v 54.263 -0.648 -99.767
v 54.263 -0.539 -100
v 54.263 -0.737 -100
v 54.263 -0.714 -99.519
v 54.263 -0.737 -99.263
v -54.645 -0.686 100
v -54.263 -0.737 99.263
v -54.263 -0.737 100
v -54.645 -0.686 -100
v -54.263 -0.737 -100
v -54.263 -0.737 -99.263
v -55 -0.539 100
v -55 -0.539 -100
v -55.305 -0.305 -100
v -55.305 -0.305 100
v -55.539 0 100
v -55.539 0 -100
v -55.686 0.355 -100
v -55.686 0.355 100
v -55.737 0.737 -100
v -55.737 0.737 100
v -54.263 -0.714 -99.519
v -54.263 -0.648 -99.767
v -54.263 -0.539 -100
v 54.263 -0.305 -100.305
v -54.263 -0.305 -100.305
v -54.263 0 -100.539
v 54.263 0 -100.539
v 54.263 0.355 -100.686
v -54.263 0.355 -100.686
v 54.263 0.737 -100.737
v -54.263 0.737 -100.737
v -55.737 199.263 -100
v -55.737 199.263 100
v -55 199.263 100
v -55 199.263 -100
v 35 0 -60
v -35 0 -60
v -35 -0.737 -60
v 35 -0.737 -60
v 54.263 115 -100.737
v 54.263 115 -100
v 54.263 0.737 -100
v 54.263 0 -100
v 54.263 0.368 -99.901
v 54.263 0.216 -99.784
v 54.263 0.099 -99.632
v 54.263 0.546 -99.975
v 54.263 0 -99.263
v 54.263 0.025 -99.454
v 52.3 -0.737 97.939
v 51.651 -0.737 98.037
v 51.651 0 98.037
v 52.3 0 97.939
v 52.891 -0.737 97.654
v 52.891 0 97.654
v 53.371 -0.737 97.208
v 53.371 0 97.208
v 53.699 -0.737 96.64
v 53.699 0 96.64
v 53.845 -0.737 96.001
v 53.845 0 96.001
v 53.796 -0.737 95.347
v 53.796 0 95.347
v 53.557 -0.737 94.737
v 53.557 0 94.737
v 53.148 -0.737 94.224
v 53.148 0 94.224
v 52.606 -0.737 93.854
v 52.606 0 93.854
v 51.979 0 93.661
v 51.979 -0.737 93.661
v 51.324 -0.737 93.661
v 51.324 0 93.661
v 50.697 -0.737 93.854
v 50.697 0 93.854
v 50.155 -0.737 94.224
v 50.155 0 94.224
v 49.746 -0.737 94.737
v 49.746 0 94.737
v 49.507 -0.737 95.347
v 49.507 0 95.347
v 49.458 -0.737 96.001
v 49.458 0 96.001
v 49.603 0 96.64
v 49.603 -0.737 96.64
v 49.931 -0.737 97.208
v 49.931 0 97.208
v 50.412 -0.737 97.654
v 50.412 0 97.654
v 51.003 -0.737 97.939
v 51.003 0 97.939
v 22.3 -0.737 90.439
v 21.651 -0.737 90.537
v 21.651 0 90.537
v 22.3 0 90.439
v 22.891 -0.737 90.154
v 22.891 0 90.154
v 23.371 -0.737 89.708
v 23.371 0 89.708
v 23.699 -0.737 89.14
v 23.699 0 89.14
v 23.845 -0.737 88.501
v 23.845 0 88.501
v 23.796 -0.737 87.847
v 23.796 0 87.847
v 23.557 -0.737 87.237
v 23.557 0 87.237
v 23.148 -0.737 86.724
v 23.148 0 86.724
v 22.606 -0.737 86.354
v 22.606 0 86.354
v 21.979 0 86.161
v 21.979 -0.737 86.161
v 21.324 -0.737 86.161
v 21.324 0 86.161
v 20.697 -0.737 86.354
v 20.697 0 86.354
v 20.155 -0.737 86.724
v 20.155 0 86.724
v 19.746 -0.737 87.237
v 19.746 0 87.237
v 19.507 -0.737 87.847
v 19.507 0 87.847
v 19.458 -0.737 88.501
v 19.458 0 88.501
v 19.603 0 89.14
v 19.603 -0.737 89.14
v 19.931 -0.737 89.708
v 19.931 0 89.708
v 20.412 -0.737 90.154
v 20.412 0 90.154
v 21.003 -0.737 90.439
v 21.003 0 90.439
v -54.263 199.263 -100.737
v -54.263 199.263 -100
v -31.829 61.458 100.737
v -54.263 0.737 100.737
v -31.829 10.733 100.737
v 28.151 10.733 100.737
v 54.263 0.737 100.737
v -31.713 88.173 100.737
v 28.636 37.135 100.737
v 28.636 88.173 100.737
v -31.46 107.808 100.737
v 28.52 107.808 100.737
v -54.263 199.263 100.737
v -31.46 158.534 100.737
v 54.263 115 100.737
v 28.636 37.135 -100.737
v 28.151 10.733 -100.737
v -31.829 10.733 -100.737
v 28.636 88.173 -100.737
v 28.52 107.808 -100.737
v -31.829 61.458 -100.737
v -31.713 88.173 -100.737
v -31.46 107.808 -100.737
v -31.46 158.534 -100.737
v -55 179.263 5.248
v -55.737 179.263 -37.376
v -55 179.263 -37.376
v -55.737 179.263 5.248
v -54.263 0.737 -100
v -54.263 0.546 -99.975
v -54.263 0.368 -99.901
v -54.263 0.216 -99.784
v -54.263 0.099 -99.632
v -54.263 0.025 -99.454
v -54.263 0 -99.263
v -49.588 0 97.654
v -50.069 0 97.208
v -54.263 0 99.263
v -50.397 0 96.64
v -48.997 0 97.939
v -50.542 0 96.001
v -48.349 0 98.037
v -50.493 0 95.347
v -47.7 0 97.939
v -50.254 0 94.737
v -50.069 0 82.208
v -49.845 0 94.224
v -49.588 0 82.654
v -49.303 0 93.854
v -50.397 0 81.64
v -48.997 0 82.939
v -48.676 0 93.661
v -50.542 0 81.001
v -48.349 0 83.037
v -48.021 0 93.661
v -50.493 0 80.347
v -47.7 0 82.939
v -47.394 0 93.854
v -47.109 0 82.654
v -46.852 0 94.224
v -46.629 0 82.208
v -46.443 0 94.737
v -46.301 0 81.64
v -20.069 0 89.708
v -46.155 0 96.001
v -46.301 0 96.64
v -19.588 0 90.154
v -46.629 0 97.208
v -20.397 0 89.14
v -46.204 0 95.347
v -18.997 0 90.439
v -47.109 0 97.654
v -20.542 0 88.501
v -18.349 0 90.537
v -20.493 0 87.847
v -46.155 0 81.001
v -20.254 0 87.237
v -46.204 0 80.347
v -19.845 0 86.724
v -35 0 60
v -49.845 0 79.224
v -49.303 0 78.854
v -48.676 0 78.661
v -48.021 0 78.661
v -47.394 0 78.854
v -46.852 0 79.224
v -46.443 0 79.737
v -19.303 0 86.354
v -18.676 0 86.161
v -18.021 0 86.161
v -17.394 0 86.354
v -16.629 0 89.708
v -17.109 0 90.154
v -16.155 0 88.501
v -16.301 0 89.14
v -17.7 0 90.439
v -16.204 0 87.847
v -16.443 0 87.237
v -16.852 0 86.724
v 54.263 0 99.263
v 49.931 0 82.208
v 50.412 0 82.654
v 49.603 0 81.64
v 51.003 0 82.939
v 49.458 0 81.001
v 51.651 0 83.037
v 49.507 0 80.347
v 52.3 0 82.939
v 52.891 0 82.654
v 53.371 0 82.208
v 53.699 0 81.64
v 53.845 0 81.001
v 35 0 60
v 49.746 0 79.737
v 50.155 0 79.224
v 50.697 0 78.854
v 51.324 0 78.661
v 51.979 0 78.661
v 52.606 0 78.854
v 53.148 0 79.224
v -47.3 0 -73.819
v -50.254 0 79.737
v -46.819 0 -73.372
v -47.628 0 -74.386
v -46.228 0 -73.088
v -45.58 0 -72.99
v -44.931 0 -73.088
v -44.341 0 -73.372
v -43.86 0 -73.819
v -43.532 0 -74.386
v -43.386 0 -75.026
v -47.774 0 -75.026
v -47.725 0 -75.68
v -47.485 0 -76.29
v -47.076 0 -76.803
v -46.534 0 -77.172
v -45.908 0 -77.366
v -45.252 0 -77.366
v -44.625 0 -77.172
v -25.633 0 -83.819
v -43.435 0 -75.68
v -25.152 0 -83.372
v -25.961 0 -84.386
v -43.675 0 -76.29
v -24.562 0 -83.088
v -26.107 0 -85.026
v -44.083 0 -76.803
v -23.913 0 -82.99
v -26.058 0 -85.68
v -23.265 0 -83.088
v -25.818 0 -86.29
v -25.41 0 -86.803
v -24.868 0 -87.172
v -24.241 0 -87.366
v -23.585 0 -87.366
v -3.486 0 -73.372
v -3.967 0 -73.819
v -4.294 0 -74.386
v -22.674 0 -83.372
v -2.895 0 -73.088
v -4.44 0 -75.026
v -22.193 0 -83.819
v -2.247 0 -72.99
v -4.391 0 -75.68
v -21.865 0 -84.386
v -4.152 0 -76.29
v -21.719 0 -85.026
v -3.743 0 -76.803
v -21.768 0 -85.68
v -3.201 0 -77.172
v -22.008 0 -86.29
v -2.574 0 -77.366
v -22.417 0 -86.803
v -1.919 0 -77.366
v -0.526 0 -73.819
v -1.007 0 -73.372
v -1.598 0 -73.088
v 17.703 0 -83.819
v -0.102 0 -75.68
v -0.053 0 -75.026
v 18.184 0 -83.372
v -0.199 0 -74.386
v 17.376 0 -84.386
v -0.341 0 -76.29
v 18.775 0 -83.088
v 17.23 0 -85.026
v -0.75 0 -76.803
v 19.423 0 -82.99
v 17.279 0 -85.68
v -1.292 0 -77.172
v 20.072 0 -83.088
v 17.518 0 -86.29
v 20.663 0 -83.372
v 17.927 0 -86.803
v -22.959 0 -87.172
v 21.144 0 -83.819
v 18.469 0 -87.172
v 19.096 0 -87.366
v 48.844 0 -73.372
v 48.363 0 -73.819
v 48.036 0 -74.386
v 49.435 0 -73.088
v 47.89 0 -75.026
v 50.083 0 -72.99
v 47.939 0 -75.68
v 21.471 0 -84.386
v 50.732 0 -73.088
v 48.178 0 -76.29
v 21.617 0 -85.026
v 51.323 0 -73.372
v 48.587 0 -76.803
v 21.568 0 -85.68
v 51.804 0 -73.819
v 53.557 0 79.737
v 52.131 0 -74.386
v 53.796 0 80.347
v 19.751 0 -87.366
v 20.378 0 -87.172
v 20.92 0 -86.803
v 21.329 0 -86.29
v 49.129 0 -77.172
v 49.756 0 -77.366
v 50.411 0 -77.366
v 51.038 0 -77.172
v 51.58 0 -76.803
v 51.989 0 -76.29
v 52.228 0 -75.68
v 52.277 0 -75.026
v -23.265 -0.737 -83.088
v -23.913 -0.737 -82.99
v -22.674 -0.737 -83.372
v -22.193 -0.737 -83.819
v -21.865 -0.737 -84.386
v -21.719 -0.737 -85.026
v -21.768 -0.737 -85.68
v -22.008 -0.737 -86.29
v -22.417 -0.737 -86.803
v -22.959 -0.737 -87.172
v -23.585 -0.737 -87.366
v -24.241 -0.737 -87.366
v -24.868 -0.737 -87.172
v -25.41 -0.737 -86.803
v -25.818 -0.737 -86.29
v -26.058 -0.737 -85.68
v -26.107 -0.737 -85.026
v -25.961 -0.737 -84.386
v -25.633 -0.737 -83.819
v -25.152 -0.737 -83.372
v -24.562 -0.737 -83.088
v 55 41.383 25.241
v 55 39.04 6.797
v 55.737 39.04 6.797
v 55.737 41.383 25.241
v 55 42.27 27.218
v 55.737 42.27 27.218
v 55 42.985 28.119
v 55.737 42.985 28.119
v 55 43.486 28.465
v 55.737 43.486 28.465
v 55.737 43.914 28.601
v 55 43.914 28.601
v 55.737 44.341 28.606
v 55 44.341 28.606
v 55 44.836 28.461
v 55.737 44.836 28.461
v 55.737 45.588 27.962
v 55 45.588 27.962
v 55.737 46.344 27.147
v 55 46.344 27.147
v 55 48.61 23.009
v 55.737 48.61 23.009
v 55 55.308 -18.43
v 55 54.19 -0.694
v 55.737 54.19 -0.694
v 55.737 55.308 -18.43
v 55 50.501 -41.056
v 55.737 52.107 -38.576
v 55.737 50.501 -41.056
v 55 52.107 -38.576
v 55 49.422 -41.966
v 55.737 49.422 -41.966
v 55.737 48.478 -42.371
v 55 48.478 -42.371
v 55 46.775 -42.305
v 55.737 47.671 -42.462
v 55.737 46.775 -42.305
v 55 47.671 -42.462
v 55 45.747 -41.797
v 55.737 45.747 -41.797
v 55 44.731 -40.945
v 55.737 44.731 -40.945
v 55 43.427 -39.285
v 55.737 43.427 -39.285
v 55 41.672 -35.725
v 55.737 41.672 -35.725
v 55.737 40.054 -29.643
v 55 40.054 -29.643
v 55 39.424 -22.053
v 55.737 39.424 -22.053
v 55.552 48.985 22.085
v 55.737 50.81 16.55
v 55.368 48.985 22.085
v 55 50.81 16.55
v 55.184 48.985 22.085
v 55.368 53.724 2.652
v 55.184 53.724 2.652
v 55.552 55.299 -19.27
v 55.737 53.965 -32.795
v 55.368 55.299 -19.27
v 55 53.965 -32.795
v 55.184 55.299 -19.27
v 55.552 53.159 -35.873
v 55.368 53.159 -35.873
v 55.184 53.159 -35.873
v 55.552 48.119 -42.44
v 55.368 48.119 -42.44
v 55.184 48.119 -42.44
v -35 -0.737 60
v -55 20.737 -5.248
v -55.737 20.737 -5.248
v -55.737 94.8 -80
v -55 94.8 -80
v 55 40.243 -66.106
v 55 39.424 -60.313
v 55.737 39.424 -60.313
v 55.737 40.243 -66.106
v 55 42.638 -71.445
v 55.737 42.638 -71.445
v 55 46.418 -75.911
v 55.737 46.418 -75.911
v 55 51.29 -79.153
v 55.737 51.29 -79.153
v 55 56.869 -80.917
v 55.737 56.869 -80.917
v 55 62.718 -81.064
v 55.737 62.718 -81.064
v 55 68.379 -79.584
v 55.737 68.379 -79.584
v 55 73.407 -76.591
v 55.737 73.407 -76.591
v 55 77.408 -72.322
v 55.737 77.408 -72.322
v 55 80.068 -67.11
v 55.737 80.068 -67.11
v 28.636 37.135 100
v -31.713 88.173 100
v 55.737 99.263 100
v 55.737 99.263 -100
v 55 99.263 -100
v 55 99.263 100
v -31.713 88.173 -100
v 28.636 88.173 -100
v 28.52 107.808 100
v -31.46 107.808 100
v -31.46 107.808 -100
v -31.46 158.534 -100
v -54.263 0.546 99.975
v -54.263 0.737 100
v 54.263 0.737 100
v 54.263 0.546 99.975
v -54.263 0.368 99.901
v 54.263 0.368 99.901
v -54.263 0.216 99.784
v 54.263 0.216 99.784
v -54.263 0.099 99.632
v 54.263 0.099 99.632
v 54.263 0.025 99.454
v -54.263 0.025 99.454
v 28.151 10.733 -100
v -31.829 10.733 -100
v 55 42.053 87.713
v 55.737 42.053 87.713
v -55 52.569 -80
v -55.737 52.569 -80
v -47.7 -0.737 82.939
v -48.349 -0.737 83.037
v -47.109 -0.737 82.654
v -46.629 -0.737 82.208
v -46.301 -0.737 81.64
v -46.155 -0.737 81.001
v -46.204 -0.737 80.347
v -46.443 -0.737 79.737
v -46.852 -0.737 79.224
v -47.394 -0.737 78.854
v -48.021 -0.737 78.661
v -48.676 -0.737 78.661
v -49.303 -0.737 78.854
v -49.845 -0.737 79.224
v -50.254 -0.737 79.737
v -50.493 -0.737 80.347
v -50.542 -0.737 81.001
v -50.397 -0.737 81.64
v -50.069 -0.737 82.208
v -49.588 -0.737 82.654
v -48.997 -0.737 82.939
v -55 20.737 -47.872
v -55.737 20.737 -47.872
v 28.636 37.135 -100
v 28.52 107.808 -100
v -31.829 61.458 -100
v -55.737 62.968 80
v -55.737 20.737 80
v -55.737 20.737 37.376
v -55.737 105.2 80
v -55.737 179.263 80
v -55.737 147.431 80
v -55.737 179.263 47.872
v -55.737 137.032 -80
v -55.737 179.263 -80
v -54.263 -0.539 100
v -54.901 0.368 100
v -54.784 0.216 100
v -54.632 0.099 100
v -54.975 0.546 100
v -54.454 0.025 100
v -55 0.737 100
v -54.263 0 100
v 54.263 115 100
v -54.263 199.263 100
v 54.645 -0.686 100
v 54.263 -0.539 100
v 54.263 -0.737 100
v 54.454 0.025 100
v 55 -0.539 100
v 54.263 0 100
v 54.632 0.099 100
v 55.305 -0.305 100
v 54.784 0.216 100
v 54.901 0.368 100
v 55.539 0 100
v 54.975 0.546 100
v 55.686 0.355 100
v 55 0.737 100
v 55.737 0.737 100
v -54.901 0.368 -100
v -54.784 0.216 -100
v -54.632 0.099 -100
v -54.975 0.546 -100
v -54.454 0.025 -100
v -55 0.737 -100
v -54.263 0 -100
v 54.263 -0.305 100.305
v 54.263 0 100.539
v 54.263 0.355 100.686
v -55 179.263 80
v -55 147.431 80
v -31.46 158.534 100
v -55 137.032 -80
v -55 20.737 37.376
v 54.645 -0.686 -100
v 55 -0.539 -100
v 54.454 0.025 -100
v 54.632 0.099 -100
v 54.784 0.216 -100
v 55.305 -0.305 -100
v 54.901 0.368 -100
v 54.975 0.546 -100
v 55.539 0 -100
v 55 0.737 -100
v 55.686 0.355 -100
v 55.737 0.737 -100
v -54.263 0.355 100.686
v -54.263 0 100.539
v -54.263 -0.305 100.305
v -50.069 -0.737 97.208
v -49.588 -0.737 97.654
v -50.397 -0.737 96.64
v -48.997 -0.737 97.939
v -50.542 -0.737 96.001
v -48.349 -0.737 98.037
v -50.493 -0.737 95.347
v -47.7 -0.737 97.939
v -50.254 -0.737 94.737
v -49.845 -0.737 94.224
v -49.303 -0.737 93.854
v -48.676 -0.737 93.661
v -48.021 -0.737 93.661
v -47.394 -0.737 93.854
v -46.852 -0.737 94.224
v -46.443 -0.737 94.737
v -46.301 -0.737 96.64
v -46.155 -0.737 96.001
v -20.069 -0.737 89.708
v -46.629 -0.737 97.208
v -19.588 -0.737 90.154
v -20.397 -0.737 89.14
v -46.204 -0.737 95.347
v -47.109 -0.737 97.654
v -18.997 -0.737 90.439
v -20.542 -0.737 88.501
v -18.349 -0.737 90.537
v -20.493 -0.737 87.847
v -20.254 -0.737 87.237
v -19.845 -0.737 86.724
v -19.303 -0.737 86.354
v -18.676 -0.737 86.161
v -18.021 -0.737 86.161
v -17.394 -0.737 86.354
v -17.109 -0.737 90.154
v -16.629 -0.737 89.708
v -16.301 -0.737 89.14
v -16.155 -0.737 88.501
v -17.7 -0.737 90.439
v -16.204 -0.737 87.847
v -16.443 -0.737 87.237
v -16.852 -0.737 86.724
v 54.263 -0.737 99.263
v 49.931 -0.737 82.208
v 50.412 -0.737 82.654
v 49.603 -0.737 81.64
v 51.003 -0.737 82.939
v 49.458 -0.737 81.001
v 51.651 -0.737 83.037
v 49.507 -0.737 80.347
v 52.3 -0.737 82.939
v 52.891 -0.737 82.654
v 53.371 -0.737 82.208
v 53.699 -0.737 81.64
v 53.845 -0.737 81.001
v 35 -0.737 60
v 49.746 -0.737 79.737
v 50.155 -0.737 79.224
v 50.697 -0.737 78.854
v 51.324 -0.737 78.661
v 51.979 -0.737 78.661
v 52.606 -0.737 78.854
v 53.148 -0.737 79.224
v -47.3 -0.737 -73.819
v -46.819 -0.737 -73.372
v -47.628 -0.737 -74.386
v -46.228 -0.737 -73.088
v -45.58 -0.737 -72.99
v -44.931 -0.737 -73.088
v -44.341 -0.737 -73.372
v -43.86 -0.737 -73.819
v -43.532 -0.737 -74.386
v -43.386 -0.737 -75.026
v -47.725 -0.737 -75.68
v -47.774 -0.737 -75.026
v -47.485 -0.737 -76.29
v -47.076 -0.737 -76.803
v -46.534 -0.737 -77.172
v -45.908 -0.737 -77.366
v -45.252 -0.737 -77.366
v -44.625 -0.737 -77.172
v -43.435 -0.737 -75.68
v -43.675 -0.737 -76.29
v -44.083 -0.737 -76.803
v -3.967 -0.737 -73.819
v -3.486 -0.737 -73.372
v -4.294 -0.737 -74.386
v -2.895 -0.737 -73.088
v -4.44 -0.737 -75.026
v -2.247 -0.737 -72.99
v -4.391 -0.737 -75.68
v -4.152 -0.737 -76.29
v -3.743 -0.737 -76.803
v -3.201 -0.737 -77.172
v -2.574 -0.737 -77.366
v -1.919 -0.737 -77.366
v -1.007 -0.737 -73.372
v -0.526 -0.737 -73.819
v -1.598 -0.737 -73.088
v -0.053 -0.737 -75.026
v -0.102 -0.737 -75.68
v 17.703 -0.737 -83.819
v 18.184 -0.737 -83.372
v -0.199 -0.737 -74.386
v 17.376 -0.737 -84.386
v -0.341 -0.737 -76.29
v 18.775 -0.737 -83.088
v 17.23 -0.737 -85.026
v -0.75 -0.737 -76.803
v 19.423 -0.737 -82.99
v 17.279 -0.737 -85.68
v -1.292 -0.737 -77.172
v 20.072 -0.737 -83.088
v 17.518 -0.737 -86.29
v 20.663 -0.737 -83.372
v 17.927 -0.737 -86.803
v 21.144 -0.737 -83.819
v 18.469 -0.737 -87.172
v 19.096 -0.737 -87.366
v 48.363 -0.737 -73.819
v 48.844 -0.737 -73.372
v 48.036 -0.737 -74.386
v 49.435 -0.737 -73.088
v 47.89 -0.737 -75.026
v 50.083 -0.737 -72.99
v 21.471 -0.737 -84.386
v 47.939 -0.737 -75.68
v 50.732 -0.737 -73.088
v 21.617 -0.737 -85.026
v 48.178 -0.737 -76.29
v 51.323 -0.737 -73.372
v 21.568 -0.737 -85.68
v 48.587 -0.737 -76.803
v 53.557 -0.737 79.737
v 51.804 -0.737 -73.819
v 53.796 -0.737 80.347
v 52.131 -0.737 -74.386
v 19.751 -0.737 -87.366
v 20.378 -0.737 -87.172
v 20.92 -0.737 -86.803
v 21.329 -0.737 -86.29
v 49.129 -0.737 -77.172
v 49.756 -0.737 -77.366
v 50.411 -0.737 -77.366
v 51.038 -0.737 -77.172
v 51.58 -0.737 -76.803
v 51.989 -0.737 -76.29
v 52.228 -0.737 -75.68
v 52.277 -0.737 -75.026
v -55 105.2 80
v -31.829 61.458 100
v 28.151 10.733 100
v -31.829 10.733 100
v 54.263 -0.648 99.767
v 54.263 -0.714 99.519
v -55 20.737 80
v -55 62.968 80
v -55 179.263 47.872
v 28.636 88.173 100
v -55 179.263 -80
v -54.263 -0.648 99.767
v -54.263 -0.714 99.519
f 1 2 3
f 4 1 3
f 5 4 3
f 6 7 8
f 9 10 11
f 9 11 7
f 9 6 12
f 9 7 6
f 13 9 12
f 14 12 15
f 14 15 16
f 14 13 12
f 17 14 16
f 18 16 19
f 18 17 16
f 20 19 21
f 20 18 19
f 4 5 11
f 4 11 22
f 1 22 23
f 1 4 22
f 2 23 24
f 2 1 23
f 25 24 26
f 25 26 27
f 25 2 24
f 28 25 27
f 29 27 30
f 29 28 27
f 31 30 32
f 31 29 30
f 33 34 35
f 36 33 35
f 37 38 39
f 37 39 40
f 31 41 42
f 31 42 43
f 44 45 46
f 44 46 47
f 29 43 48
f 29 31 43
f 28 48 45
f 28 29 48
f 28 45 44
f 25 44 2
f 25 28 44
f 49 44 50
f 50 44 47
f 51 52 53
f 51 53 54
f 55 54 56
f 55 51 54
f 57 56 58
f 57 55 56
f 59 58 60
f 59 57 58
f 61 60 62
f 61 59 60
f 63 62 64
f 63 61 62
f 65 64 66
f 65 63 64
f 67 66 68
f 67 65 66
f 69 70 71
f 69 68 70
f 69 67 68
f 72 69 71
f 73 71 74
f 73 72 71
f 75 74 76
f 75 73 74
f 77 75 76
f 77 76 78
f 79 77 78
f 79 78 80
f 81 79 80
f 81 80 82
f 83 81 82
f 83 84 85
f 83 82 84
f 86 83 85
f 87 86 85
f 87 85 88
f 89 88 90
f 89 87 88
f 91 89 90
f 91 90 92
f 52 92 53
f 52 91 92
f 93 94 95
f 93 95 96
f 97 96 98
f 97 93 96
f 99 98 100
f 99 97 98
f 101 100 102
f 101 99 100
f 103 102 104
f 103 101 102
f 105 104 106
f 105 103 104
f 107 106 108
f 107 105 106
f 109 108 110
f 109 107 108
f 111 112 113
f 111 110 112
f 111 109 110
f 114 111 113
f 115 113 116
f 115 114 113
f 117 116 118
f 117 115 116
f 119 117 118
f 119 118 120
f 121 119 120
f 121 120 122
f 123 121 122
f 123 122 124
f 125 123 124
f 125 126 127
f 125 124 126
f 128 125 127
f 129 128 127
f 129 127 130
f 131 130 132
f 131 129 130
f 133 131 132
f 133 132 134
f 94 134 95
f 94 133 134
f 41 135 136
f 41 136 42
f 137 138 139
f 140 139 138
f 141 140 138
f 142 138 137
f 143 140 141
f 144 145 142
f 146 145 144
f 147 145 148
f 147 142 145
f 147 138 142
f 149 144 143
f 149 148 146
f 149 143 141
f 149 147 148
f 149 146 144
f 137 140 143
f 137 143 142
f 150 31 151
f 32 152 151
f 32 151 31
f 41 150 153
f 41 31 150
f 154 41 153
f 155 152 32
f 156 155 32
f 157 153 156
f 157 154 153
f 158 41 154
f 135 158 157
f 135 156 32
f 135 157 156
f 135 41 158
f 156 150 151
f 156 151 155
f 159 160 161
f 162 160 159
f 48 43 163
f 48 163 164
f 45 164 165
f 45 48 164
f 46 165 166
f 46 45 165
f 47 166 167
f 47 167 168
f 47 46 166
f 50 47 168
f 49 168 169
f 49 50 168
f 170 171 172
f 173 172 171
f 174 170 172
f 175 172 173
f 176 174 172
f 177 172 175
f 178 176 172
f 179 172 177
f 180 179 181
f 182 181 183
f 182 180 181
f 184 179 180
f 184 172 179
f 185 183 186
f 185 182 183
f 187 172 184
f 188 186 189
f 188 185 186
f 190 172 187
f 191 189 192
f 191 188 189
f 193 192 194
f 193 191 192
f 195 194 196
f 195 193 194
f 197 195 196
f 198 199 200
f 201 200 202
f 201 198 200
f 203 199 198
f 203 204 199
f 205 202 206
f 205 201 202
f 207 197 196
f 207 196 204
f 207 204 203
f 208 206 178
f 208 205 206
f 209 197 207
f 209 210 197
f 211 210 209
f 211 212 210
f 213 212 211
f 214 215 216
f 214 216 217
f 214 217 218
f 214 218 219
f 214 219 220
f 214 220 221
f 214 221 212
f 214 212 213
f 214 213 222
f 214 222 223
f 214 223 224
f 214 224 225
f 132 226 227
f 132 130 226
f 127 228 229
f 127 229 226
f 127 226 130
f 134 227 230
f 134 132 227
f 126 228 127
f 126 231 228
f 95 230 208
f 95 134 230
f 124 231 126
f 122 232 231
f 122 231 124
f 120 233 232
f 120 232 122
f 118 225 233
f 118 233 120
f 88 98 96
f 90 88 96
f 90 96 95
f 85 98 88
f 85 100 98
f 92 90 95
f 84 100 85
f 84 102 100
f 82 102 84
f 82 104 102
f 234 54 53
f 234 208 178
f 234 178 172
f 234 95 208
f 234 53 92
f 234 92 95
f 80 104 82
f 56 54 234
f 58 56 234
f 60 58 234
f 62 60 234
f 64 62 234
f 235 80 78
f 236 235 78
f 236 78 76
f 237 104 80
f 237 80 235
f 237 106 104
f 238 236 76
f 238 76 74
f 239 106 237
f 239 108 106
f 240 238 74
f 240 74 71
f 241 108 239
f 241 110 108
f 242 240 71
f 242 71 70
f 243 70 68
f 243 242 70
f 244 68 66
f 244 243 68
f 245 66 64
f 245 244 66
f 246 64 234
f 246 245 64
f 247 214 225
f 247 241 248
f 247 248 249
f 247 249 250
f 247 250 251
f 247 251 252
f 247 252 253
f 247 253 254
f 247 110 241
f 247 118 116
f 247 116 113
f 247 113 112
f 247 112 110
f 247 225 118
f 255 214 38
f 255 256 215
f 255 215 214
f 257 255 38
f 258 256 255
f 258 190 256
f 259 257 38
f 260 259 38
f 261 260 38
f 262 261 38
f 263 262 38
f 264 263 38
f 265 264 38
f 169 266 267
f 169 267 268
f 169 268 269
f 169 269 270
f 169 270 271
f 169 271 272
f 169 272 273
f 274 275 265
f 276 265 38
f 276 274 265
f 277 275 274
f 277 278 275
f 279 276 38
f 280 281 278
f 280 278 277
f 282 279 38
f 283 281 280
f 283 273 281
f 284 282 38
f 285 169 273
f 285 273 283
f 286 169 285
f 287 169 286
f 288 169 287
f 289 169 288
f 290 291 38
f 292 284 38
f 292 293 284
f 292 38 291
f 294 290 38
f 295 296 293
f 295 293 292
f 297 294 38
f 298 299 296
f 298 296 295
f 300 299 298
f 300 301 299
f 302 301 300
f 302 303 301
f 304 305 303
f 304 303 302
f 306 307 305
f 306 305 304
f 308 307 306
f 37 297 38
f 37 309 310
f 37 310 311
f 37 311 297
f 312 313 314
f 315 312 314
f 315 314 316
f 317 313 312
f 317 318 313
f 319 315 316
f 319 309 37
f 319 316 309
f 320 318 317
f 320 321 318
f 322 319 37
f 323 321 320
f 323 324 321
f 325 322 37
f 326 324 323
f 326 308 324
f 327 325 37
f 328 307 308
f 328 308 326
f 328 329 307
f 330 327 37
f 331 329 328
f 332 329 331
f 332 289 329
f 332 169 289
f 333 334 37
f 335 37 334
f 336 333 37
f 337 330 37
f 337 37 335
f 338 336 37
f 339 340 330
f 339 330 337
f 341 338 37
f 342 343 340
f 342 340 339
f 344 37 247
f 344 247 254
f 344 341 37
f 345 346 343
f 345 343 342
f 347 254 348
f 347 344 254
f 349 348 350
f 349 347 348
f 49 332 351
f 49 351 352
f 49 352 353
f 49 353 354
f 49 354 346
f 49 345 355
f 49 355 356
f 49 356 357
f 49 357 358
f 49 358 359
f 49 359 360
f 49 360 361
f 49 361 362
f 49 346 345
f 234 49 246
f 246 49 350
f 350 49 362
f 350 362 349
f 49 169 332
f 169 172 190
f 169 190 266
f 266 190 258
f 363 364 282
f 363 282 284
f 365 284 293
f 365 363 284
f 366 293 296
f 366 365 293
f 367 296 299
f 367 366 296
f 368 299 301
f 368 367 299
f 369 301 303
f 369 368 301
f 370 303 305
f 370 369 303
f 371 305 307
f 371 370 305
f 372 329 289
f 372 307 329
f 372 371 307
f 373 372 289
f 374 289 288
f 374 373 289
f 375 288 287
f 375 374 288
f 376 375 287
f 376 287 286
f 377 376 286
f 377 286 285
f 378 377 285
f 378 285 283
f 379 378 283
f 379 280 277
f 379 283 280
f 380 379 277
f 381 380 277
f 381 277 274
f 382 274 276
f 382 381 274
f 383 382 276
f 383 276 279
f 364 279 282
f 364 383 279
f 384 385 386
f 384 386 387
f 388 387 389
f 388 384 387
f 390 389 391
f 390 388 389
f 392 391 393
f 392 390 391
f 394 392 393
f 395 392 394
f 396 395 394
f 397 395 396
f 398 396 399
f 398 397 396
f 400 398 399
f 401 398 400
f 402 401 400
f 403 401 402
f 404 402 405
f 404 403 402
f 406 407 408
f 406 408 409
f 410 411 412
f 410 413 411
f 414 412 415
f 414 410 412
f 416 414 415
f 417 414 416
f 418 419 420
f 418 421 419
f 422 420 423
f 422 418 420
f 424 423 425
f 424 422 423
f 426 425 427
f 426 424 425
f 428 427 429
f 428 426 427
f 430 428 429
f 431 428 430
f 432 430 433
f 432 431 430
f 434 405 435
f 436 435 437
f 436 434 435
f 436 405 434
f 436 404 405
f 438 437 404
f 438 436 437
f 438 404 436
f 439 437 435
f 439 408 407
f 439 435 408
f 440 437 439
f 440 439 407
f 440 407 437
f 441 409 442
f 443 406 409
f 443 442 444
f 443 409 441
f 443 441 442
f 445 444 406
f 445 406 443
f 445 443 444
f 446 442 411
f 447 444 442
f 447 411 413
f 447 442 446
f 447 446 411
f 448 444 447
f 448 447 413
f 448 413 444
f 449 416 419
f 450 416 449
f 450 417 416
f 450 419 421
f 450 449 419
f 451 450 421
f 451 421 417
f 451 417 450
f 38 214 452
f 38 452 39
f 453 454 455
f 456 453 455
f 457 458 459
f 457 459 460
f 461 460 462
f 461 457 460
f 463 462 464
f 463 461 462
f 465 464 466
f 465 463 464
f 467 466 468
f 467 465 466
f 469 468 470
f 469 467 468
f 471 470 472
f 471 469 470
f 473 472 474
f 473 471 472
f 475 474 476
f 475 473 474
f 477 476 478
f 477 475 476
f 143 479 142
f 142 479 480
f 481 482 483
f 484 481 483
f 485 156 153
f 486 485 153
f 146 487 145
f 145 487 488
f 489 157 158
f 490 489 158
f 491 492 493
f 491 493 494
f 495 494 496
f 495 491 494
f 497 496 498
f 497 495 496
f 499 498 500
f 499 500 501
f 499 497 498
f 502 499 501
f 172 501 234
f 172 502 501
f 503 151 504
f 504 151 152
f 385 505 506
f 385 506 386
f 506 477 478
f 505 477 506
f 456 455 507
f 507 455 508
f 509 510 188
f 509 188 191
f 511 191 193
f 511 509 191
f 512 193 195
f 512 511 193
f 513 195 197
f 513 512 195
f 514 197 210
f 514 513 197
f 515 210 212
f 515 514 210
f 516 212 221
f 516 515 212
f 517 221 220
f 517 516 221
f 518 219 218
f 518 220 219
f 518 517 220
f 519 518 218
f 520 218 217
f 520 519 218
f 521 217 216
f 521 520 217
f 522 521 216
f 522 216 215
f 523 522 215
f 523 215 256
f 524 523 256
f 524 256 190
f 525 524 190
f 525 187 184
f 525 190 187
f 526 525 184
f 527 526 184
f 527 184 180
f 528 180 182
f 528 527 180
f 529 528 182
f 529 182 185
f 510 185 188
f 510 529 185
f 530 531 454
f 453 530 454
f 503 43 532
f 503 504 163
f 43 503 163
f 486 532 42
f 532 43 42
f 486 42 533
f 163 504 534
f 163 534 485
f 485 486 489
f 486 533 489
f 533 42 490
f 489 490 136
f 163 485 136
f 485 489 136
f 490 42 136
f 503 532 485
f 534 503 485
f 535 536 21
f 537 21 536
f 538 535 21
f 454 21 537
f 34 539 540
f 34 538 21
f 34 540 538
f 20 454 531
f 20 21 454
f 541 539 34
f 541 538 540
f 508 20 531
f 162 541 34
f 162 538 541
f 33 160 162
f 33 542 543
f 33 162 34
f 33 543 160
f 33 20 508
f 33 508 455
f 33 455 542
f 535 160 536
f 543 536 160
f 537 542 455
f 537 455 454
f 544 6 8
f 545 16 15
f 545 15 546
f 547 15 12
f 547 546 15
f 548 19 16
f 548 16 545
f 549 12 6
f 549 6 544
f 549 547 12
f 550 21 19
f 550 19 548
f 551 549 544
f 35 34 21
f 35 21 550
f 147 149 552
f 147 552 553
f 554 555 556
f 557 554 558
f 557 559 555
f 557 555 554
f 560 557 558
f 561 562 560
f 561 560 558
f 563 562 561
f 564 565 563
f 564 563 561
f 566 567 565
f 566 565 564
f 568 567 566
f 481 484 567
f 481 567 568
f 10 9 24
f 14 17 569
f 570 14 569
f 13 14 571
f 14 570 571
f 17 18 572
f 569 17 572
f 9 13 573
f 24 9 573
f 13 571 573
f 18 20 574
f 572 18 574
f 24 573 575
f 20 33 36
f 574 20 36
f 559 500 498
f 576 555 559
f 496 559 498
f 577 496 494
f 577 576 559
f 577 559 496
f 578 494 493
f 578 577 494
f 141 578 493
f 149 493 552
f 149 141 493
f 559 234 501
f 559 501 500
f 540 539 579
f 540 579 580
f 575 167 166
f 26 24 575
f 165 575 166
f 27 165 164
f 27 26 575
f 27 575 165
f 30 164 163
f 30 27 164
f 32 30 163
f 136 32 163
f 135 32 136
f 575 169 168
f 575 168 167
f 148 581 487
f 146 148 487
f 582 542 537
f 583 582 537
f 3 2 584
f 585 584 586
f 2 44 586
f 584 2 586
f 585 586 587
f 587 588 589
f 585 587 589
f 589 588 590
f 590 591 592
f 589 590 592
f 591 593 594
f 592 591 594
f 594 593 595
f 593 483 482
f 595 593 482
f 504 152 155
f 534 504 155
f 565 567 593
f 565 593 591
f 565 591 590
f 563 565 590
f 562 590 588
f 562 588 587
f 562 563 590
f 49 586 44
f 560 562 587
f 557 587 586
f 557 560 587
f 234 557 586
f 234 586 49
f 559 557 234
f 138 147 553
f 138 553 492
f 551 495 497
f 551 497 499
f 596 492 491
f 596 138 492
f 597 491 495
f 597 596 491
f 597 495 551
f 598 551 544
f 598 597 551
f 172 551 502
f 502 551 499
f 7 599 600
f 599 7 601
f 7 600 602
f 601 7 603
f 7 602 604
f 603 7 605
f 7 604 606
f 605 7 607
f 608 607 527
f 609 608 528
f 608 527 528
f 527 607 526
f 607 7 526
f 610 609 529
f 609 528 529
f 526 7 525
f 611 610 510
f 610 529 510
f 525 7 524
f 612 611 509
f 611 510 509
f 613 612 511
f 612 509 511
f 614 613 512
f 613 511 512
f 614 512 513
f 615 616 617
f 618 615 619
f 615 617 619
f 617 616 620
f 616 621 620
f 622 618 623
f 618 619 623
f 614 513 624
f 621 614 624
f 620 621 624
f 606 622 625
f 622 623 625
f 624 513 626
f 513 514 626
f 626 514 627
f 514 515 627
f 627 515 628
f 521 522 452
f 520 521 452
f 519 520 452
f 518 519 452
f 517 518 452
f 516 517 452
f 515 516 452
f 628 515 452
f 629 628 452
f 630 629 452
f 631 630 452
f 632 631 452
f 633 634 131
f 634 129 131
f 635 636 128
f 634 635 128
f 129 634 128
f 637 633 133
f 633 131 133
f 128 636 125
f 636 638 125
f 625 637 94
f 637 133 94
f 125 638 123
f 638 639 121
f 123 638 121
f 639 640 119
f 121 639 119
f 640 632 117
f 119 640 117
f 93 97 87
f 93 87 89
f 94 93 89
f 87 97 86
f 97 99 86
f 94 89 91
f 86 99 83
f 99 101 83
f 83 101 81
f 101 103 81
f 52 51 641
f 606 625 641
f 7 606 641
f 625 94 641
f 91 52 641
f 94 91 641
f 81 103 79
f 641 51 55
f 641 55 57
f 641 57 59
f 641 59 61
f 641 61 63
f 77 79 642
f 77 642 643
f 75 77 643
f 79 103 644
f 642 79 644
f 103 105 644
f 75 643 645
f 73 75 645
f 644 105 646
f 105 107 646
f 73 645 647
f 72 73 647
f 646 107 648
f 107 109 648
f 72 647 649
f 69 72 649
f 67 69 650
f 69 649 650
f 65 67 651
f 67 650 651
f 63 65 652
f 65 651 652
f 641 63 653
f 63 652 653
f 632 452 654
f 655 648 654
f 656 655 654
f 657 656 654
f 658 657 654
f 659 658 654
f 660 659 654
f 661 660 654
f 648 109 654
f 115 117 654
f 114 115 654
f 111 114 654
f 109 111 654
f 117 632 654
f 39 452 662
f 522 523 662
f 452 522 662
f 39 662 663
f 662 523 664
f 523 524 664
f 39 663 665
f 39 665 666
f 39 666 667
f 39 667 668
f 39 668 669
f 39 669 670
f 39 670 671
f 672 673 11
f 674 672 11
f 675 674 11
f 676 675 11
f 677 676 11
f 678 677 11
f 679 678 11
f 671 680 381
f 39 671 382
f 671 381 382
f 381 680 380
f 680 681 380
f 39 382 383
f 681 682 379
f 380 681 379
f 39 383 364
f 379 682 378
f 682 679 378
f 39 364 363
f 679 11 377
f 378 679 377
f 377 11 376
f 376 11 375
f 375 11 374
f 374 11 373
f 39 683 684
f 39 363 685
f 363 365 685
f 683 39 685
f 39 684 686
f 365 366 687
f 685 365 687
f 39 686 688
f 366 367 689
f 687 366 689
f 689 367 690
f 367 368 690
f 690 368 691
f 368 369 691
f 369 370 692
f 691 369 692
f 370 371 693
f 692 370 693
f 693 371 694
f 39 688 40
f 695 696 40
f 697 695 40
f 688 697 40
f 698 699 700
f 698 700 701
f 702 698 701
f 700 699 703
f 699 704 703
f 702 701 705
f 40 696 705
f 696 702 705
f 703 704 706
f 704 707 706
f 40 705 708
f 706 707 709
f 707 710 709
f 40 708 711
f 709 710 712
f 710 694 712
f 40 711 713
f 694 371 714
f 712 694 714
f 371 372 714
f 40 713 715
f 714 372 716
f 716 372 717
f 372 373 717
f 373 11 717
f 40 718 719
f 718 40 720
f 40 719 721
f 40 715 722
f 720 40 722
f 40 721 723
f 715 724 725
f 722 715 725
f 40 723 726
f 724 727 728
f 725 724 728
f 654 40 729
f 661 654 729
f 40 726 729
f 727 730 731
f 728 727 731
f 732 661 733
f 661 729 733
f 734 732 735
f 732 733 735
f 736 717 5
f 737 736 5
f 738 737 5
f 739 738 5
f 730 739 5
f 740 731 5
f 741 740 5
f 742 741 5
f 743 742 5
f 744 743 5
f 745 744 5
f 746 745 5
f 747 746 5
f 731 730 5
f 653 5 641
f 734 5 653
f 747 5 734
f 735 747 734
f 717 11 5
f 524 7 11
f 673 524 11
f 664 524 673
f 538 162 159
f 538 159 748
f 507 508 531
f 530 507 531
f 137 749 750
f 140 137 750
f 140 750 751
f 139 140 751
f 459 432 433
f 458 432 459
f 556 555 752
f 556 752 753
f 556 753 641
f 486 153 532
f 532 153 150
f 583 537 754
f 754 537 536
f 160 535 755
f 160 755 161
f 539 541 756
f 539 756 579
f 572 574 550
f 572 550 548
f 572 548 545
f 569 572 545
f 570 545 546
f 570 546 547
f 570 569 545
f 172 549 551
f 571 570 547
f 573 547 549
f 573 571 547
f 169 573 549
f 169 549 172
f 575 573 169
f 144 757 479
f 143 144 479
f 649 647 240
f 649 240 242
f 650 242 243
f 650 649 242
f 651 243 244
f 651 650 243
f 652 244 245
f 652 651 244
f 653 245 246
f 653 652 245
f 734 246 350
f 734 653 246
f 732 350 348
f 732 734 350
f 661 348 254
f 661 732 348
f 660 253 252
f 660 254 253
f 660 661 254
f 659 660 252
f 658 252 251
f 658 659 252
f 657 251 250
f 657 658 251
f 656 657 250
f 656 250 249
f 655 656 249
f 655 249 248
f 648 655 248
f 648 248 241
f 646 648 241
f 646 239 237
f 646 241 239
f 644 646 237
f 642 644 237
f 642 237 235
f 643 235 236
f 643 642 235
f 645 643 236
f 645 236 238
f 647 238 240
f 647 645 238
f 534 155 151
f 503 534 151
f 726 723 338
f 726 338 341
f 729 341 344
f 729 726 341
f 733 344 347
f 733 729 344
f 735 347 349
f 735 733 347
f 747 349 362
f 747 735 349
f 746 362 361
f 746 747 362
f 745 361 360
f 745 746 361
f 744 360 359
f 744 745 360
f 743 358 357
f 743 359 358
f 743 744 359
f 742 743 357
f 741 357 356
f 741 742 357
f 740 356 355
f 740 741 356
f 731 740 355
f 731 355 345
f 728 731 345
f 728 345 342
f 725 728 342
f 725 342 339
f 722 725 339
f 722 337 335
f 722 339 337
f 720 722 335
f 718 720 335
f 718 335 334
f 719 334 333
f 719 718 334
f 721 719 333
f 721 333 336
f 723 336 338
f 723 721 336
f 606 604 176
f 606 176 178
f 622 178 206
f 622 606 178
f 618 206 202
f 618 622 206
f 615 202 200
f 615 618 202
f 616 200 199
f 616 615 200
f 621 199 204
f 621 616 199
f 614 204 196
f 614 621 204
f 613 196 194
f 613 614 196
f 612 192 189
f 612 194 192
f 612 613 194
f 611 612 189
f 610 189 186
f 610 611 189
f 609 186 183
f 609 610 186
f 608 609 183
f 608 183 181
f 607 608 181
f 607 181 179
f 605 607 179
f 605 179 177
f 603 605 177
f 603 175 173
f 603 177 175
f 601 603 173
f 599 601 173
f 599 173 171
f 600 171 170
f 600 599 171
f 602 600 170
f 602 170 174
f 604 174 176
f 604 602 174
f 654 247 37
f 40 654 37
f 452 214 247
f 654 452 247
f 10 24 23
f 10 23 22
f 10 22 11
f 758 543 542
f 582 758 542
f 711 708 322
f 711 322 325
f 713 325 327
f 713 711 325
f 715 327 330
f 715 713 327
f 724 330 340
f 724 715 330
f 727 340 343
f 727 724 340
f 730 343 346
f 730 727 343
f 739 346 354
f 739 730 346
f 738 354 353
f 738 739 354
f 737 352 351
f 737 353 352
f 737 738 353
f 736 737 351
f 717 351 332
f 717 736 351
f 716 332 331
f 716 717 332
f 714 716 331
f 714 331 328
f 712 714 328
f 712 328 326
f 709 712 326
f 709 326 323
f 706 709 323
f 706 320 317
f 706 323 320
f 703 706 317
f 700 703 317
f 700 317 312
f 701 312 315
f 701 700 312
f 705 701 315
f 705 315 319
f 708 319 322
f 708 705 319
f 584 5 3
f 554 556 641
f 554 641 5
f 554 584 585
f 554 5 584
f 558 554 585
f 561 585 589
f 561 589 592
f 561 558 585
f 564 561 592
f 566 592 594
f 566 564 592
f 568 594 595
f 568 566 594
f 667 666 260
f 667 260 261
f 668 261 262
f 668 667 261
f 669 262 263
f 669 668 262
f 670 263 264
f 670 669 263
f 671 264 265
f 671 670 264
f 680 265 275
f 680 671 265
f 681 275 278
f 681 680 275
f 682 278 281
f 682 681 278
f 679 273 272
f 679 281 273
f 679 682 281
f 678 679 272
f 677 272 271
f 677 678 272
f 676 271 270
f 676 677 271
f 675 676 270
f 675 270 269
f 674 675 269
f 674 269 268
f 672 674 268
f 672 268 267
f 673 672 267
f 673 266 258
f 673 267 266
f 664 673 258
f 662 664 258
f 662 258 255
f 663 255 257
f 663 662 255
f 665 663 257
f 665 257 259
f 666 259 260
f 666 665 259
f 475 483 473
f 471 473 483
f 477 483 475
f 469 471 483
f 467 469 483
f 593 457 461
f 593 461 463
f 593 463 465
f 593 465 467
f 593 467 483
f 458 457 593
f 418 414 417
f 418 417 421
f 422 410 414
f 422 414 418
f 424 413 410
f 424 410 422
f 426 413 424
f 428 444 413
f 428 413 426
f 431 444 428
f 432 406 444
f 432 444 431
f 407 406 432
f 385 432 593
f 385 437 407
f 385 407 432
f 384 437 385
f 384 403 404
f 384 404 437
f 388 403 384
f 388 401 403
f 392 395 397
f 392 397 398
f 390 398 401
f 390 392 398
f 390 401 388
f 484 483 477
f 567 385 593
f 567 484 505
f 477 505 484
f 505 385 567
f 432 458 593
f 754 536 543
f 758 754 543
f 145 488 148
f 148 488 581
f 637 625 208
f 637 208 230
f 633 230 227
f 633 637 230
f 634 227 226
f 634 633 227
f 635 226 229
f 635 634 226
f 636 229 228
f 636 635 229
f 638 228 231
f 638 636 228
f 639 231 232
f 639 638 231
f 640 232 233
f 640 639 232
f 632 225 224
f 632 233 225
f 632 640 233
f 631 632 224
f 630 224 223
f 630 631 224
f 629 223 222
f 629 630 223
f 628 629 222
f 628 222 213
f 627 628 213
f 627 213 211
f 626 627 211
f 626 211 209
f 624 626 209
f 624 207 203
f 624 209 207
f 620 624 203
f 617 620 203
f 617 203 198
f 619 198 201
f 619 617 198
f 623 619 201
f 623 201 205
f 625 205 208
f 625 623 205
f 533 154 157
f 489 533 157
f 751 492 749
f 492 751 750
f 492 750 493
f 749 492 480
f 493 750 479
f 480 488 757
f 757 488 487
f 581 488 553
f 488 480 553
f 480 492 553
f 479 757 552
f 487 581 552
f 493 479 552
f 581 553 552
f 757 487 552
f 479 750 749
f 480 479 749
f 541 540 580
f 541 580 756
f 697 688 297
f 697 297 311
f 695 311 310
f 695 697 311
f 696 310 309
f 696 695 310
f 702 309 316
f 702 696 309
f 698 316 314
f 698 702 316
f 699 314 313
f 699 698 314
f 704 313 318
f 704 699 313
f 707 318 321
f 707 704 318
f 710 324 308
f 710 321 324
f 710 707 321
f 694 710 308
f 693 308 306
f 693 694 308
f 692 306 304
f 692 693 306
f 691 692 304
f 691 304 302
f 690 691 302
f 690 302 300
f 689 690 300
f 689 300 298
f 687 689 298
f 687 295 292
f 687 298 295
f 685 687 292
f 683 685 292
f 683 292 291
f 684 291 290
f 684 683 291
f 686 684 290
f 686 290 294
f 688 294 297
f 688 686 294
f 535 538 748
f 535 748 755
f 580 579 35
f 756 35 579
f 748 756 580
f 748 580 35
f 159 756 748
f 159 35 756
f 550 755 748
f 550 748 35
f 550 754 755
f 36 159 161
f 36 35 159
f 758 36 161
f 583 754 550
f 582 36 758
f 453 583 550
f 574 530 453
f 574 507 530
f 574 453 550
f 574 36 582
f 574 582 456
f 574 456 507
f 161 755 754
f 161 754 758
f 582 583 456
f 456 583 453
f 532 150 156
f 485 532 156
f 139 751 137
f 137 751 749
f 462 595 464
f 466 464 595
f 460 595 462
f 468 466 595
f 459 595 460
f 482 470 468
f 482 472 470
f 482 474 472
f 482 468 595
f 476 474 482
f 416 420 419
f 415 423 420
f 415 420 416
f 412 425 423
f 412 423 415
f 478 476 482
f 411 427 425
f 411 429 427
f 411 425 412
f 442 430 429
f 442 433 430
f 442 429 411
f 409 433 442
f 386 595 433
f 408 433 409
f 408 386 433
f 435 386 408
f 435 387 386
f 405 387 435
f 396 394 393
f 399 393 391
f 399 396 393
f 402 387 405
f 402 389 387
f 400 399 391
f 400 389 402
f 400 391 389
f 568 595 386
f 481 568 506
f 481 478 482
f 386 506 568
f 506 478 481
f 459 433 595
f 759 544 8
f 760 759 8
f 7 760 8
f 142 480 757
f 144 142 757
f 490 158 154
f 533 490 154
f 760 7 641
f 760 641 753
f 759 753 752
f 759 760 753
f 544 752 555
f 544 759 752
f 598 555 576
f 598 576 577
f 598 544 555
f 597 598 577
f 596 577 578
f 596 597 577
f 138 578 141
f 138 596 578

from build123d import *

# Parameters (mm, degrees)
SKETCH1_W                    = 110
SKETCH1_H                    = 200
SKETCH1_W_2                  = 70
SKETCH1_H_2                  = 120
BASE_FLANGE1_DEPTH           = 0.7366
EDGE_FLANGE1_STRIP_W         = 4.4196
EDGE_FLANGE1_STRIP_H         = 0.7366
EDGE_FLANGE1_STRIP_CUT_DEPTH = 200
EDGE_FLANGE1_DEPTH           = 200
EDGE_FLANGE2_STRIP_W         = 4.4196
EDGE_FLANGE2_STRIP_H         = 0.7366
EDGE_FLANGE2_STRIP_CUT_DEPTH = 200
EDGE_FLANGE2_DEPTH           = 200
EDGE_FLANGE3_STRIP_W         = 4.4196
EDGE_FLANGE3_STRIP_H         = 0.7366
EDGE_FLANGE3_STRIP_CUT_DEPTH = 108.5268
EDGE_FLANGE3_DEPTH           = 108.5268
EDGE_FLANGE3_START           = 0.7366
EDGE_FLANGE3_FLAT_DEPTH      = 0.7366
EDGE_FLANGE4_STRIP_W         = 4.4196
EDGE_FLANGE4_STRIP_H         = 0.7366
EDGE_FLANGE4_STRIP_CUT_DEPTH = 108.5268
EDGE_FLANGE4_DEPTH           = 108.5268
EDGE_FLANGE4_START           = 0.7366
EDGE_FLANGE4_FLAT_DEPTH      = 0.7366
CUT_EXTRUDE2_DEPTH           = 289.797370967
CUT_EXTRUDE3_START           = -0.7366
CUT_EXTRUDE3_DEPTH           = 0.7366
CUT_EXTRUDE6_DEPTH           = 800.082459726
CUT_EXTRUDE6_DEPTH_BACK      = 800.082459726
SKETCH53_R                   = 2.2
SKETCH53_R_2                 = 2.199999998
CUT_EXTRUDE7_DEPTH           = 10


# Read off the part's stored shape, not the designer's step: Cut-Extrude3
# Sheet-metal steps are written as plain solids
with BuildPart() as part:
    # Sketch1 → Base-Flange1 (new body)
    with BuildSketch(Plane(origin=(0, 0, 0), x_dir=(1, 0, 0), z_dir=(0, 1, 0))):
        Rectangle(SKETCH1_W, SKETCH1_H)
        Rectangle(SKETCH1_W_2, SKETCH1_H_2, mode=Mode.SUBTRACT)
    extrude(amount=-BASE_FLANGE1_DEPTH)

    # Edge-Flange1 strip (across the edge) → Edge-Flange1 strip cut (cut)
    with BuildSketch(Plane(origin=(-55, 0, -100), x_dir=(1, 0, 0), z_dir=(0, 0, 1))):
        with Locations((-1.4732, -0.3683)):
            Rectangle(EDGE_FLANGE1_STRIP_W, EDGE_FLANGE1_STRIP_H)
    extrude(amount=EDGE_FLANGE1_STRIP_CUT_DEPTH, mode=Mode.SUBTRACT)

    # Edge-Flange1 section (across the edge) → Edge-Flange1 (add)
    with BuildSketch(Plane(origin=(-55, 0, -100), x_dir=(1, 0, 0), z_dir=(0, 0, 1))):
        with BuildLine():
            Line((-0.7366, 0.7366), (-0.7366, 199.2634))
            Line((-0.7366, 199.2634), (0, 199.2634))
            Line((0, 199.2634), (0, 0.7366))
            ThreePointArc((0, 0.7366), (0.215745145, 0.215745145), (0.7366, 0))
            Line((0.7366, 0), (0.7366, -0.7366))
            ThreePointArc((0.7366, -0.7366), (-0.30510971, -0.30510971), (-0.7366, 0.7366))
        make_face()
    extrude(amount=EDGE_FLANGE1_DEPTH)

    # Edge-Flange2 strip (across the edge) → Edge-Flange2 strip cut (cut)
    with BuildSketch(Plane(origin=(55, 0, 100), x_dir=(-1, 0, 0), z_dir=(0, 0, -1))):
        with Locations((-1.4732, -0.3683)):
            Rectangle(EDGE_FLANGE2_STRIP_W, EDGE_FLANGE2_STRIP_H)
    extrude(amount=EDGE_FLANGE2_STRIP_CUT_DEPTH, mode=Mode.SUBTRACT)

    # Edge-Flange2 section (across the edge) → Edge-Flange2 (add)
    with BuildSketch(Plane(origin=(55, 0, 100), x_dir=(-1, 0, 0), z_dir=(0, 0, -1))):
        with BuildLine():
            Line((-0.7366, 0.7366), (-0.7366, 99.2634))
            Line((-0.7366, 99.2634), (0, 99.2634))
            Line((0, 99.2634), (0, 0.7366))
            ThreePointArc((0, 0.7366), (0.215745145, 0.215745145), (0.7366, 0))
            Line((0.7366, 0), (0.7366, -0.7366))
            ThreePointArc((0.7366, -0.7366), (-0.30510971, -0.30510971), (-0.7366, 0.7366))
        make_face()
    extrude(amount=EDGE_FLANGE2_DEPTH)

    # Edge-Flange3 strip (across the edge) → Edge-Flange3 strip cut (cut)
    with BuildSketch(Plane(origin=(54.2634, 0, -100), x_dir=(0, 0, 1), z_dir=(-1, 0, 0))):
        with Locations((-1.4732, -0.3683)):
            Rectangle(EDGE_FLANGE3_STRIP_W, EDGE_FLANGE3_STRIP_H)
    extrude(amount=EDGE_FLANGE3_STRIP_CUT_DEPTH, mode=Mode.SUBTRACT)

    # Edge-Flange3 bend section (across the edge) → Edge-Flange3 (add)
    with BuildSketch(Plane(origin=(54.2634, 0, -100), x_dir=(0, 0, 1), z_dir=(-1, 0, 0))):
        with BuildLine():
            Line((-0.7366, 0.7366), (0, 0.7366))
            ThreePointArc((0, 0.7366), (0.215745145, 0.215745145), (0.7366, 0))
            Line((0.7366, 0), (0.7366, -0.7366))
            ThreePointArc((0.7366, -0.7366), (-0.30510971, -0.30510971), (-0.7366, 0.7366))
        make_face()
    extrude(amount=EDGE_FLANGE3_DEPTH)

    # Edge-Flange3 profile (on flange) → Edge-Flange3 flat (add)
    with BuildSketch(Plane(origin=(0, 0, -100), x_dir=(-1, 0, 0), z_dir=(0, 0, -1)).offset(EDGE_FLANGE3_START)):
        Polygon((-54.2634, 115), (-54.2634, 0.7366), (54.2634, 0.7366), (54.2634, 199.2634), align=None)
    extrude(amount=-EDGE_FLANGE3_FLAT_DEPTH)

    # Edge-Flange4 strip (across the edge) → Edge-Flange4 strip cut (cut)
    with BuildSketch(Plane(origin=(-54.2634, 0, 100), x_dir=(0, 0, -1), z_dir=(1, 0, 0))):
        with Locations((-1.4732, -0.3683)):
            Rectangle(EDGE_FLANGE4_STRIP_W, EDGE_FLANGE4_STRIP_H)
    extrude(amount=EDGE_FLANGE4_STRIP_CUT_DEPTH, mode=Mode.SUBTRACT)

    # Edge-Flange4 bend section (across the edge) → Edge-Flange4 (add)
    with BuildSketch(Plane(origin=(-54.2634, 0, 100), x_dir=(0, 0, -1), z_dir=(1, 0, 0))):
        with BuildLine():
            Line((-0.7366, 0.7366), (0, 0.7366))
            ThreePointArc((0, 0.7366), (0.215745145, 0.215745145), (0.7366, 0))
            Line((0.7366, 0), (0.7366, -0.7366))
            ThreePointArc((0.7366, -0.7366), (-0.30510971, -0.30510971), (-0.7366, 0.7366))
        make_face()
    extrude(amount=EDGE_FLANGE4_DEPTH)

    # Edge-Flange4 profile (on flange) → Edge-Flange4 flat (add)
    with BuildSketch(Plane.XY.offset(100).offset(EDGE_FLANGE4_START)):
        Polygon((-54.2634, 199.2634), (-54.2634, 0.7366), (54.2634, 0.7366), (54.2634, 115), align=None)
    extrude(amount=-EDGE_FLANGE4_FLAT_DEPTH)

    # Sketch24 → Cut-Extrude2 (cut, through all)
    with BuildSketch(Plane(origin=(0, 0, -100.7366), x_dir=(-1, 0, 0), z_dir=(0, 0, -1))):
        Polygon((-28.519875042, 107.808063094), (31.460124178, 107.808063094), (31.460124178, 158.533542729), align=None)
        Polygon((-28.150641863, 10.732953924), (31.829357358, 10.732953924), (31.829357358, 61.45843356), align=None)
        Polygon((31.713150602, 88.173102361), (-28.636081798, 88.173102361), (-28.636081798, 37.135359798), align=None)
    extrude(amount=-CUT_EXTRUDE2_DEPTH, mode=Mode.SUBTRACT)

    # Cut-Extrude3 outline → Cut-Extrude3 (cut)
    with BuildSketch(Plane(origin=(55.7366, 0, 0), x_dir=(0, 0, -1), z_dir=(1, 0, 0)).offset(CUT_EXTRUDE3_START)):
        with BuildLine():
            Line((-87.713422796, 42.053472661), (-6.797155753, 39.040000774))
            add(Edge.make_bspline(
                [(-6.797155753, 39.040000774), (-87.713422796, 42.053472661), (67.110125935, 80.068334048), (60.312641059, 39.424036929), (22.052524279, 39.424036929)],
                knots=[0, 0, 0, 0, 0, 1, 1, 1, 1, 1], degree=4))
            Line((22.052524279, 39.424036929), (60.312641059, 39.424036929))
            ThreePointArc((60.312641059, 39.424036929), (80.917037974, 56.86865569), (67.110125935, 80.068334048))
            Line((67.110125935, 80.068334048), (-87.713422796, 42.053472661))
        make_face()
    extrude(amount=CUT_EXTRUDE3_DEPTH, mode=Mode.SUBTRACT)

    # Sketch53 → Cut-Extrude6 (cut, two sides: drawn at the far end of the back side and taken through both)
    with BuildSketch(Plane(origin=(344.115063699, 0, 561.793038506), x_dir=(-1, 0, 0), z_dir=(0, 1, 0)).offset(-CUT_EXTRUDE6_DEPTH_BACK)):
        with Locations(Location((392.463649434, -480.956438506, 0), (0, 0, 90))):
            Circle(SKETCH53_R)
        with Locations(Location((392.463649434, -465.956438506, 0), (0, 0, 90))):
            Circle(SKETCH53_R)
        with Locations(Location((362.463649434, -473.456438506, 0), (0, 0, 90))):
            Circle(SKETCH53_R)
        with Locations(Location((292.463649434, -480.956438506, 0), (0, 0, 90))):
            Circle(SKETCH53_R)
        with Locations(Location((292.463649434, -465.956438506, 0), (0, 0, 90))):
            Circle(SKETCH53_R)
        with Locations(Location((322.463649434, -473.456438506, 0), (0, 0, 90))):
            Circle(SKETCH53_R)
        with Locations(Location((294.03158687, -636.983238506, 0), (0, 0, 90))):
            Circle(SKETCH53_R_2)
        with Locations(Location((324.69158687, -646.983238506, 0), (0, 0, 90))):
            Circle(SKETCH53_R_2)
        with Locations(Location((346.36158687, -636.983238506, 0), (0, 0, 90))):
            Circle(SKETCH53_R_2)
        with Locations(Location((368.028253537, -646.983238506, 0), (0, 0, 90))):
            Circle(SKETCH53_R_2)
        with Locations(Location((389.694920203, -636.983238506, 0), (0, 0, 90))):
            Circle(SKETCH53_R_2)
    extrude(amount=CUT_EXTRUDE6_DEPTH + CUT_EXTRUDE6_DEPTH_BACK, mode=Mode.SUBTRACT)

    # Sketch54 → Cut-Extrude7 (cut)
    with BuildSketch(Plane.ZY.offset(55.7366)):
        Polygon((-37.376001553, 179.2634), (5.247996894, 179.2634), (80, 105.199675962), (80, 62.968137981), align=None)
        Polygon((-80, 179.2634), (-80, 137.031862019), (37.376001553, 20.7366), (80, 20.7366), align=None)
        Polygon((-47.87199534, 20.7366), (-5.247996894, 20.7366), (-80, 94.800324038), (-80, 52.568786057), align=None)
        Polygon((80, 179.2634), (80, 147.431213943), (47.87199534, 179.2634), align=None)
    extrude(amount=-CUT_EXTRUDE7_DEPTH, mode=Mode.SUBTRACT)


solid = part.part
